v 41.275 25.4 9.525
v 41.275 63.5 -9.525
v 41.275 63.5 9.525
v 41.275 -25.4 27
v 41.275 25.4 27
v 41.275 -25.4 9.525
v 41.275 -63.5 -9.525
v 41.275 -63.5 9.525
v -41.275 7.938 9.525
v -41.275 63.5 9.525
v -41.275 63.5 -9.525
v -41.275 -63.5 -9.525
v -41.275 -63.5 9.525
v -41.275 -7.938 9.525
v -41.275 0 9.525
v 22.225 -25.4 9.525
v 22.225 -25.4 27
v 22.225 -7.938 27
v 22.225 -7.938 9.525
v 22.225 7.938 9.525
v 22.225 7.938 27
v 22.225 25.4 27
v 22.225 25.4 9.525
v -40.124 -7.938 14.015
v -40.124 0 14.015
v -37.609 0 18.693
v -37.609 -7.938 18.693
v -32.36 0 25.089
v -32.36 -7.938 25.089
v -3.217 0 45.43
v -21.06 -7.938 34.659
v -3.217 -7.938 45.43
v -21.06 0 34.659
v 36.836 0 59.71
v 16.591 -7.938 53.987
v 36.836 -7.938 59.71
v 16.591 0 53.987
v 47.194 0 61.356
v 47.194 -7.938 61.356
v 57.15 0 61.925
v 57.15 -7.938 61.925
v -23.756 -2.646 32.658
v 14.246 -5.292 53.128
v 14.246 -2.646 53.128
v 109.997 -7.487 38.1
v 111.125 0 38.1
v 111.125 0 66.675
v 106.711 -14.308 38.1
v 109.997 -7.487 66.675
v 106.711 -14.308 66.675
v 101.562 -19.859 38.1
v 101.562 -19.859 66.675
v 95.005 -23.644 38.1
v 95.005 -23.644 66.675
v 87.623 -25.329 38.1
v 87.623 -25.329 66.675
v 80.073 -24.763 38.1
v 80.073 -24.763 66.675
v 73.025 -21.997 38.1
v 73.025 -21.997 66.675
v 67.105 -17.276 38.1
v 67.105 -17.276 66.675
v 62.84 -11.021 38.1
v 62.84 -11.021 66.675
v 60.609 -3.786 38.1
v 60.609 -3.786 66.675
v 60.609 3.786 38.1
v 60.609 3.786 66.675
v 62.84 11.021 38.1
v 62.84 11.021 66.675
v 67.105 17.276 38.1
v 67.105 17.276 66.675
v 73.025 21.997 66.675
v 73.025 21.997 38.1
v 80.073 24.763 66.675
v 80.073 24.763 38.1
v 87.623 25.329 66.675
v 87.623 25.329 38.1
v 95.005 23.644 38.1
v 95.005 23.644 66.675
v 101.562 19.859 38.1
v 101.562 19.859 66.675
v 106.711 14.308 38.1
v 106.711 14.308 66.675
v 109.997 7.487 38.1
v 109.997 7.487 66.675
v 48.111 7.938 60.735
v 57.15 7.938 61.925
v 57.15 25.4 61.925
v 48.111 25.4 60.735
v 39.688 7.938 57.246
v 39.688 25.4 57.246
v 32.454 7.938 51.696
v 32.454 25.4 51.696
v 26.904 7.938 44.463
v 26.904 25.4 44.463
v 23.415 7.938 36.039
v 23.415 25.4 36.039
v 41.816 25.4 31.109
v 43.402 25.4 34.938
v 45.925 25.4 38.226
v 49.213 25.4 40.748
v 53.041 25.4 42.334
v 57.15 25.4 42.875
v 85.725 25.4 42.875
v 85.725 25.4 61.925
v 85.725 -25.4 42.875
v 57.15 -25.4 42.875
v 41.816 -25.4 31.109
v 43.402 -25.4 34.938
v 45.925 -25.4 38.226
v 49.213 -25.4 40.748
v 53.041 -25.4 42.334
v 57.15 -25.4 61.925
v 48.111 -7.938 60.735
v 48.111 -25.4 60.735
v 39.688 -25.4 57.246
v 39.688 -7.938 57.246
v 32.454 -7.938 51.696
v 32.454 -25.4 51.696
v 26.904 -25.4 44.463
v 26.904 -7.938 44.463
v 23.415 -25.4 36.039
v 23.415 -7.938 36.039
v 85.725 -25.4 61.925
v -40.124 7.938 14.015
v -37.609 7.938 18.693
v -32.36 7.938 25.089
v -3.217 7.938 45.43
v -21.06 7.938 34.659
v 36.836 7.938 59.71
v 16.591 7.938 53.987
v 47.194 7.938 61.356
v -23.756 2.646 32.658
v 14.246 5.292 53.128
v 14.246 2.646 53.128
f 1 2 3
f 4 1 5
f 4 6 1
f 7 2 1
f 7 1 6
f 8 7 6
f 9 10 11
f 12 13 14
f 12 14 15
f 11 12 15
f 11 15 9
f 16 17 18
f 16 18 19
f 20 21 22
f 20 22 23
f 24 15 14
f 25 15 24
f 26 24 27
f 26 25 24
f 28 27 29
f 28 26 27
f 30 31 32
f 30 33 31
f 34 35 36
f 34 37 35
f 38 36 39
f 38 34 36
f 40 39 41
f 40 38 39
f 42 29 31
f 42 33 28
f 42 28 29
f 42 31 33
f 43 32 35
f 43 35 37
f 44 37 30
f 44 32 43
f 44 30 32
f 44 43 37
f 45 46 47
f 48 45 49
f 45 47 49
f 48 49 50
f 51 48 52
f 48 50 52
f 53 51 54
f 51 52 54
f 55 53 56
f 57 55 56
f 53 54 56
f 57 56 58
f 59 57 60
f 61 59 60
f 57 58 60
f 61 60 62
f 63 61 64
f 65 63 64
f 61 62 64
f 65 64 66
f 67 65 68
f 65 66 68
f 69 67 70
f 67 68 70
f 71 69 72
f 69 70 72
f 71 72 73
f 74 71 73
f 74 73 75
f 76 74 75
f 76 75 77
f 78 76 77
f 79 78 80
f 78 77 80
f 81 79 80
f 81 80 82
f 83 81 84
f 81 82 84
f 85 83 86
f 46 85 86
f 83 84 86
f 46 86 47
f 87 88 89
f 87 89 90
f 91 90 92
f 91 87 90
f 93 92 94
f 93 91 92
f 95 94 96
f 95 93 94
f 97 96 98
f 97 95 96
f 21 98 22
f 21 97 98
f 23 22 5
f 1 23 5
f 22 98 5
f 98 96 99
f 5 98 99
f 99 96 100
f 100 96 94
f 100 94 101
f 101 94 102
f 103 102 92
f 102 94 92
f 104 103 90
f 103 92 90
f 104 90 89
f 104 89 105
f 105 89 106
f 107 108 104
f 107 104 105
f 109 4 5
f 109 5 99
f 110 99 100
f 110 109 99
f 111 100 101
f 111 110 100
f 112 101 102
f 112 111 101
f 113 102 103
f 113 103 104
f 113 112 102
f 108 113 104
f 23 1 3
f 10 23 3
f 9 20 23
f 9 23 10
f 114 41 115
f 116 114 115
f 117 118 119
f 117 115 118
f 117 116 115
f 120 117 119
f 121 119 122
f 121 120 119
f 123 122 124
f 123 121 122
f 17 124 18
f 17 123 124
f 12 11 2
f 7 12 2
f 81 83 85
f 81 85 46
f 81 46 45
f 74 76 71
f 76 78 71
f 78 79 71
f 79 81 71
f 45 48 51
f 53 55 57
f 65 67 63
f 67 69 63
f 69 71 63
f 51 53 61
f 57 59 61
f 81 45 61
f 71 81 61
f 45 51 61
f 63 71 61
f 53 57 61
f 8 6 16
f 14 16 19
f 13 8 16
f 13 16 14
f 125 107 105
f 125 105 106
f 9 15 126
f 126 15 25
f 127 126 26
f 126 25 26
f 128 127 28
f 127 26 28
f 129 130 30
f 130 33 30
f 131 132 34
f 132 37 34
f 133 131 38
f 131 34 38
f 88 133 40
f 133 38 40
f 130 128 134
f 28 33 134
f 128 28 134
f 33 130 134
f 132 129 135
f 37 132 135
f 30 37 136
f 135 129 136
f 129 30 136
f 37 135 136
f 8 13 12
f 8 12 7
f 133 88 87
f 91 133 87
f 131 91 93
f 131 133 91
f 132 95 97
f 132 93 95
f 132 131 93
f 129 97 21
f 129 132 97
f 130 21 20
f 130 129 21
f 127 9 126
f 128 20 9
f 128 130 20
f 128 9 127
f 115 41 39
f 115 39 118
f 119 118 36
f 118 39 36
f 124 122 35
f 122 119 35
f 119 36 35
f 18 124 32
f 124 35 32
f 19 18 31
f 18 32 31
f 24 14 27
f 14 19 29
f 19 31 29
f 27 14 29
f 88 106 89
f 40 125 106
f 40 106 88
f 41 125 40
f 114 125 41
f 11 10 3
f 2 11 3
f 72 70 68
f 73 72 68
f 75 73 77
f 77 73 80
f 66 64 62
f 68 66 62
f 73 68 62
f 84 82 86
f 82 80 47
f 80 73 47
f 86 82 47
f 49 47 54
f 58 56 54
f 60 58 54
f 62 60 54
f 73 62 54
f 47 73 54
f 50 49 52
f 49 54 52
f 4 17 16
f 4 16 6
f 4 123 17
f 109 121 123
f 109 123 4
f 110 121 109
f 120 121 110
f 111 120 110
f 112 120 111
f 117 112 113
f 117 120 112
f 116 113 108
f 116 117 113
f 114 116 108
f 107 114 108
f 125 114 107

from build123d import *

# Parameters (mm, degrees)
F1_DEPTH = 63.5
F0_W     = 25.4
F0_H     = 19.05
F2_DEPTH = 25.4
F3_DEPTH = 7.9375


with BuildPart() as f1:
    # F0 (on Front) → F1 (new body, symmetric)
    with BuildSketch(Plane.XZ):
        Polygon((22.225, 9.525), (-41.275, 9.525), (-41.275, -9.525), (41.275, -9.525), (41.275, 9.525), align=None)
    extrude(amount=F1_DEPTH, both=True)

    # F0 (on Front) → F2 (join, symmetric)
    with BuildSketch(Plane.XZ):
        with BuildLine():
            Line((22.225, 27.0002), (22.225, 9.525))
            Line((22.225, 9.525), (41.275, 9.525))
            Line((41.275, 9.525), (41.275, 27.0002))
            ThreePointArc((41.275, 27.0002), (45.92468, 38.22552), (57.15, 42.8752))
            Line((57.15, 42.8752), (60.325, 42.8752))
            Line((60.325, 42.8752), (60.325, 61.9252))
            Line((60.325, 61.9252), (57.15, 61.9252))
            ThreePointArc((57.15, 61.9252), (32.454296, 51.695904), (22.225, 27.0002))
        make_face()
        with Locations((73.025, 52.4002)):
            Rectangle(F0_W, F0_H)
    extrude(amount=F2_DEPTH, both=True)

    # F0 (on Front) → F3 (join, symmetric)
    with BuildSketch(Plane.XZ):
        with BuildLine():
            add(Edge.make_bspline(
                [(-41.275, 9.525), (-39.190046, 30.985953), (16.987981, 61.968822), (57.15, 61.9252)],
                knots=[0, 0, 0, 0, 111.504536, 111.504536, 111.504536, 111.504536], degree=3))
            Line((-41.275, 9.525), (22.225, 9.525))
            Line((22.225, 9.525), (22.225, 27.0002))
            ThreePointArc((22.225, 27.0002), (32.454296, 51.695904), (57.15, 61.9252))
        make_face()
    extrude(amount=F3_DEPTH, both=True)


with BuildPart() as f4:
    # F0 (on Front) → F4 (revolve)
    with BuildSketch(Plane.XZ):
        Polygon((85.725, 66.675), (85.725, 61.9252), (85.725, 42.8752), (85.725, 38.1), (111.125, 38.1), (111.125, 66.675), align=None)
    revolve(axis=Axis((85.725, 0, 52.4002), (0, 0, -1)))


solid = Compound([f1.part, f4.part])
